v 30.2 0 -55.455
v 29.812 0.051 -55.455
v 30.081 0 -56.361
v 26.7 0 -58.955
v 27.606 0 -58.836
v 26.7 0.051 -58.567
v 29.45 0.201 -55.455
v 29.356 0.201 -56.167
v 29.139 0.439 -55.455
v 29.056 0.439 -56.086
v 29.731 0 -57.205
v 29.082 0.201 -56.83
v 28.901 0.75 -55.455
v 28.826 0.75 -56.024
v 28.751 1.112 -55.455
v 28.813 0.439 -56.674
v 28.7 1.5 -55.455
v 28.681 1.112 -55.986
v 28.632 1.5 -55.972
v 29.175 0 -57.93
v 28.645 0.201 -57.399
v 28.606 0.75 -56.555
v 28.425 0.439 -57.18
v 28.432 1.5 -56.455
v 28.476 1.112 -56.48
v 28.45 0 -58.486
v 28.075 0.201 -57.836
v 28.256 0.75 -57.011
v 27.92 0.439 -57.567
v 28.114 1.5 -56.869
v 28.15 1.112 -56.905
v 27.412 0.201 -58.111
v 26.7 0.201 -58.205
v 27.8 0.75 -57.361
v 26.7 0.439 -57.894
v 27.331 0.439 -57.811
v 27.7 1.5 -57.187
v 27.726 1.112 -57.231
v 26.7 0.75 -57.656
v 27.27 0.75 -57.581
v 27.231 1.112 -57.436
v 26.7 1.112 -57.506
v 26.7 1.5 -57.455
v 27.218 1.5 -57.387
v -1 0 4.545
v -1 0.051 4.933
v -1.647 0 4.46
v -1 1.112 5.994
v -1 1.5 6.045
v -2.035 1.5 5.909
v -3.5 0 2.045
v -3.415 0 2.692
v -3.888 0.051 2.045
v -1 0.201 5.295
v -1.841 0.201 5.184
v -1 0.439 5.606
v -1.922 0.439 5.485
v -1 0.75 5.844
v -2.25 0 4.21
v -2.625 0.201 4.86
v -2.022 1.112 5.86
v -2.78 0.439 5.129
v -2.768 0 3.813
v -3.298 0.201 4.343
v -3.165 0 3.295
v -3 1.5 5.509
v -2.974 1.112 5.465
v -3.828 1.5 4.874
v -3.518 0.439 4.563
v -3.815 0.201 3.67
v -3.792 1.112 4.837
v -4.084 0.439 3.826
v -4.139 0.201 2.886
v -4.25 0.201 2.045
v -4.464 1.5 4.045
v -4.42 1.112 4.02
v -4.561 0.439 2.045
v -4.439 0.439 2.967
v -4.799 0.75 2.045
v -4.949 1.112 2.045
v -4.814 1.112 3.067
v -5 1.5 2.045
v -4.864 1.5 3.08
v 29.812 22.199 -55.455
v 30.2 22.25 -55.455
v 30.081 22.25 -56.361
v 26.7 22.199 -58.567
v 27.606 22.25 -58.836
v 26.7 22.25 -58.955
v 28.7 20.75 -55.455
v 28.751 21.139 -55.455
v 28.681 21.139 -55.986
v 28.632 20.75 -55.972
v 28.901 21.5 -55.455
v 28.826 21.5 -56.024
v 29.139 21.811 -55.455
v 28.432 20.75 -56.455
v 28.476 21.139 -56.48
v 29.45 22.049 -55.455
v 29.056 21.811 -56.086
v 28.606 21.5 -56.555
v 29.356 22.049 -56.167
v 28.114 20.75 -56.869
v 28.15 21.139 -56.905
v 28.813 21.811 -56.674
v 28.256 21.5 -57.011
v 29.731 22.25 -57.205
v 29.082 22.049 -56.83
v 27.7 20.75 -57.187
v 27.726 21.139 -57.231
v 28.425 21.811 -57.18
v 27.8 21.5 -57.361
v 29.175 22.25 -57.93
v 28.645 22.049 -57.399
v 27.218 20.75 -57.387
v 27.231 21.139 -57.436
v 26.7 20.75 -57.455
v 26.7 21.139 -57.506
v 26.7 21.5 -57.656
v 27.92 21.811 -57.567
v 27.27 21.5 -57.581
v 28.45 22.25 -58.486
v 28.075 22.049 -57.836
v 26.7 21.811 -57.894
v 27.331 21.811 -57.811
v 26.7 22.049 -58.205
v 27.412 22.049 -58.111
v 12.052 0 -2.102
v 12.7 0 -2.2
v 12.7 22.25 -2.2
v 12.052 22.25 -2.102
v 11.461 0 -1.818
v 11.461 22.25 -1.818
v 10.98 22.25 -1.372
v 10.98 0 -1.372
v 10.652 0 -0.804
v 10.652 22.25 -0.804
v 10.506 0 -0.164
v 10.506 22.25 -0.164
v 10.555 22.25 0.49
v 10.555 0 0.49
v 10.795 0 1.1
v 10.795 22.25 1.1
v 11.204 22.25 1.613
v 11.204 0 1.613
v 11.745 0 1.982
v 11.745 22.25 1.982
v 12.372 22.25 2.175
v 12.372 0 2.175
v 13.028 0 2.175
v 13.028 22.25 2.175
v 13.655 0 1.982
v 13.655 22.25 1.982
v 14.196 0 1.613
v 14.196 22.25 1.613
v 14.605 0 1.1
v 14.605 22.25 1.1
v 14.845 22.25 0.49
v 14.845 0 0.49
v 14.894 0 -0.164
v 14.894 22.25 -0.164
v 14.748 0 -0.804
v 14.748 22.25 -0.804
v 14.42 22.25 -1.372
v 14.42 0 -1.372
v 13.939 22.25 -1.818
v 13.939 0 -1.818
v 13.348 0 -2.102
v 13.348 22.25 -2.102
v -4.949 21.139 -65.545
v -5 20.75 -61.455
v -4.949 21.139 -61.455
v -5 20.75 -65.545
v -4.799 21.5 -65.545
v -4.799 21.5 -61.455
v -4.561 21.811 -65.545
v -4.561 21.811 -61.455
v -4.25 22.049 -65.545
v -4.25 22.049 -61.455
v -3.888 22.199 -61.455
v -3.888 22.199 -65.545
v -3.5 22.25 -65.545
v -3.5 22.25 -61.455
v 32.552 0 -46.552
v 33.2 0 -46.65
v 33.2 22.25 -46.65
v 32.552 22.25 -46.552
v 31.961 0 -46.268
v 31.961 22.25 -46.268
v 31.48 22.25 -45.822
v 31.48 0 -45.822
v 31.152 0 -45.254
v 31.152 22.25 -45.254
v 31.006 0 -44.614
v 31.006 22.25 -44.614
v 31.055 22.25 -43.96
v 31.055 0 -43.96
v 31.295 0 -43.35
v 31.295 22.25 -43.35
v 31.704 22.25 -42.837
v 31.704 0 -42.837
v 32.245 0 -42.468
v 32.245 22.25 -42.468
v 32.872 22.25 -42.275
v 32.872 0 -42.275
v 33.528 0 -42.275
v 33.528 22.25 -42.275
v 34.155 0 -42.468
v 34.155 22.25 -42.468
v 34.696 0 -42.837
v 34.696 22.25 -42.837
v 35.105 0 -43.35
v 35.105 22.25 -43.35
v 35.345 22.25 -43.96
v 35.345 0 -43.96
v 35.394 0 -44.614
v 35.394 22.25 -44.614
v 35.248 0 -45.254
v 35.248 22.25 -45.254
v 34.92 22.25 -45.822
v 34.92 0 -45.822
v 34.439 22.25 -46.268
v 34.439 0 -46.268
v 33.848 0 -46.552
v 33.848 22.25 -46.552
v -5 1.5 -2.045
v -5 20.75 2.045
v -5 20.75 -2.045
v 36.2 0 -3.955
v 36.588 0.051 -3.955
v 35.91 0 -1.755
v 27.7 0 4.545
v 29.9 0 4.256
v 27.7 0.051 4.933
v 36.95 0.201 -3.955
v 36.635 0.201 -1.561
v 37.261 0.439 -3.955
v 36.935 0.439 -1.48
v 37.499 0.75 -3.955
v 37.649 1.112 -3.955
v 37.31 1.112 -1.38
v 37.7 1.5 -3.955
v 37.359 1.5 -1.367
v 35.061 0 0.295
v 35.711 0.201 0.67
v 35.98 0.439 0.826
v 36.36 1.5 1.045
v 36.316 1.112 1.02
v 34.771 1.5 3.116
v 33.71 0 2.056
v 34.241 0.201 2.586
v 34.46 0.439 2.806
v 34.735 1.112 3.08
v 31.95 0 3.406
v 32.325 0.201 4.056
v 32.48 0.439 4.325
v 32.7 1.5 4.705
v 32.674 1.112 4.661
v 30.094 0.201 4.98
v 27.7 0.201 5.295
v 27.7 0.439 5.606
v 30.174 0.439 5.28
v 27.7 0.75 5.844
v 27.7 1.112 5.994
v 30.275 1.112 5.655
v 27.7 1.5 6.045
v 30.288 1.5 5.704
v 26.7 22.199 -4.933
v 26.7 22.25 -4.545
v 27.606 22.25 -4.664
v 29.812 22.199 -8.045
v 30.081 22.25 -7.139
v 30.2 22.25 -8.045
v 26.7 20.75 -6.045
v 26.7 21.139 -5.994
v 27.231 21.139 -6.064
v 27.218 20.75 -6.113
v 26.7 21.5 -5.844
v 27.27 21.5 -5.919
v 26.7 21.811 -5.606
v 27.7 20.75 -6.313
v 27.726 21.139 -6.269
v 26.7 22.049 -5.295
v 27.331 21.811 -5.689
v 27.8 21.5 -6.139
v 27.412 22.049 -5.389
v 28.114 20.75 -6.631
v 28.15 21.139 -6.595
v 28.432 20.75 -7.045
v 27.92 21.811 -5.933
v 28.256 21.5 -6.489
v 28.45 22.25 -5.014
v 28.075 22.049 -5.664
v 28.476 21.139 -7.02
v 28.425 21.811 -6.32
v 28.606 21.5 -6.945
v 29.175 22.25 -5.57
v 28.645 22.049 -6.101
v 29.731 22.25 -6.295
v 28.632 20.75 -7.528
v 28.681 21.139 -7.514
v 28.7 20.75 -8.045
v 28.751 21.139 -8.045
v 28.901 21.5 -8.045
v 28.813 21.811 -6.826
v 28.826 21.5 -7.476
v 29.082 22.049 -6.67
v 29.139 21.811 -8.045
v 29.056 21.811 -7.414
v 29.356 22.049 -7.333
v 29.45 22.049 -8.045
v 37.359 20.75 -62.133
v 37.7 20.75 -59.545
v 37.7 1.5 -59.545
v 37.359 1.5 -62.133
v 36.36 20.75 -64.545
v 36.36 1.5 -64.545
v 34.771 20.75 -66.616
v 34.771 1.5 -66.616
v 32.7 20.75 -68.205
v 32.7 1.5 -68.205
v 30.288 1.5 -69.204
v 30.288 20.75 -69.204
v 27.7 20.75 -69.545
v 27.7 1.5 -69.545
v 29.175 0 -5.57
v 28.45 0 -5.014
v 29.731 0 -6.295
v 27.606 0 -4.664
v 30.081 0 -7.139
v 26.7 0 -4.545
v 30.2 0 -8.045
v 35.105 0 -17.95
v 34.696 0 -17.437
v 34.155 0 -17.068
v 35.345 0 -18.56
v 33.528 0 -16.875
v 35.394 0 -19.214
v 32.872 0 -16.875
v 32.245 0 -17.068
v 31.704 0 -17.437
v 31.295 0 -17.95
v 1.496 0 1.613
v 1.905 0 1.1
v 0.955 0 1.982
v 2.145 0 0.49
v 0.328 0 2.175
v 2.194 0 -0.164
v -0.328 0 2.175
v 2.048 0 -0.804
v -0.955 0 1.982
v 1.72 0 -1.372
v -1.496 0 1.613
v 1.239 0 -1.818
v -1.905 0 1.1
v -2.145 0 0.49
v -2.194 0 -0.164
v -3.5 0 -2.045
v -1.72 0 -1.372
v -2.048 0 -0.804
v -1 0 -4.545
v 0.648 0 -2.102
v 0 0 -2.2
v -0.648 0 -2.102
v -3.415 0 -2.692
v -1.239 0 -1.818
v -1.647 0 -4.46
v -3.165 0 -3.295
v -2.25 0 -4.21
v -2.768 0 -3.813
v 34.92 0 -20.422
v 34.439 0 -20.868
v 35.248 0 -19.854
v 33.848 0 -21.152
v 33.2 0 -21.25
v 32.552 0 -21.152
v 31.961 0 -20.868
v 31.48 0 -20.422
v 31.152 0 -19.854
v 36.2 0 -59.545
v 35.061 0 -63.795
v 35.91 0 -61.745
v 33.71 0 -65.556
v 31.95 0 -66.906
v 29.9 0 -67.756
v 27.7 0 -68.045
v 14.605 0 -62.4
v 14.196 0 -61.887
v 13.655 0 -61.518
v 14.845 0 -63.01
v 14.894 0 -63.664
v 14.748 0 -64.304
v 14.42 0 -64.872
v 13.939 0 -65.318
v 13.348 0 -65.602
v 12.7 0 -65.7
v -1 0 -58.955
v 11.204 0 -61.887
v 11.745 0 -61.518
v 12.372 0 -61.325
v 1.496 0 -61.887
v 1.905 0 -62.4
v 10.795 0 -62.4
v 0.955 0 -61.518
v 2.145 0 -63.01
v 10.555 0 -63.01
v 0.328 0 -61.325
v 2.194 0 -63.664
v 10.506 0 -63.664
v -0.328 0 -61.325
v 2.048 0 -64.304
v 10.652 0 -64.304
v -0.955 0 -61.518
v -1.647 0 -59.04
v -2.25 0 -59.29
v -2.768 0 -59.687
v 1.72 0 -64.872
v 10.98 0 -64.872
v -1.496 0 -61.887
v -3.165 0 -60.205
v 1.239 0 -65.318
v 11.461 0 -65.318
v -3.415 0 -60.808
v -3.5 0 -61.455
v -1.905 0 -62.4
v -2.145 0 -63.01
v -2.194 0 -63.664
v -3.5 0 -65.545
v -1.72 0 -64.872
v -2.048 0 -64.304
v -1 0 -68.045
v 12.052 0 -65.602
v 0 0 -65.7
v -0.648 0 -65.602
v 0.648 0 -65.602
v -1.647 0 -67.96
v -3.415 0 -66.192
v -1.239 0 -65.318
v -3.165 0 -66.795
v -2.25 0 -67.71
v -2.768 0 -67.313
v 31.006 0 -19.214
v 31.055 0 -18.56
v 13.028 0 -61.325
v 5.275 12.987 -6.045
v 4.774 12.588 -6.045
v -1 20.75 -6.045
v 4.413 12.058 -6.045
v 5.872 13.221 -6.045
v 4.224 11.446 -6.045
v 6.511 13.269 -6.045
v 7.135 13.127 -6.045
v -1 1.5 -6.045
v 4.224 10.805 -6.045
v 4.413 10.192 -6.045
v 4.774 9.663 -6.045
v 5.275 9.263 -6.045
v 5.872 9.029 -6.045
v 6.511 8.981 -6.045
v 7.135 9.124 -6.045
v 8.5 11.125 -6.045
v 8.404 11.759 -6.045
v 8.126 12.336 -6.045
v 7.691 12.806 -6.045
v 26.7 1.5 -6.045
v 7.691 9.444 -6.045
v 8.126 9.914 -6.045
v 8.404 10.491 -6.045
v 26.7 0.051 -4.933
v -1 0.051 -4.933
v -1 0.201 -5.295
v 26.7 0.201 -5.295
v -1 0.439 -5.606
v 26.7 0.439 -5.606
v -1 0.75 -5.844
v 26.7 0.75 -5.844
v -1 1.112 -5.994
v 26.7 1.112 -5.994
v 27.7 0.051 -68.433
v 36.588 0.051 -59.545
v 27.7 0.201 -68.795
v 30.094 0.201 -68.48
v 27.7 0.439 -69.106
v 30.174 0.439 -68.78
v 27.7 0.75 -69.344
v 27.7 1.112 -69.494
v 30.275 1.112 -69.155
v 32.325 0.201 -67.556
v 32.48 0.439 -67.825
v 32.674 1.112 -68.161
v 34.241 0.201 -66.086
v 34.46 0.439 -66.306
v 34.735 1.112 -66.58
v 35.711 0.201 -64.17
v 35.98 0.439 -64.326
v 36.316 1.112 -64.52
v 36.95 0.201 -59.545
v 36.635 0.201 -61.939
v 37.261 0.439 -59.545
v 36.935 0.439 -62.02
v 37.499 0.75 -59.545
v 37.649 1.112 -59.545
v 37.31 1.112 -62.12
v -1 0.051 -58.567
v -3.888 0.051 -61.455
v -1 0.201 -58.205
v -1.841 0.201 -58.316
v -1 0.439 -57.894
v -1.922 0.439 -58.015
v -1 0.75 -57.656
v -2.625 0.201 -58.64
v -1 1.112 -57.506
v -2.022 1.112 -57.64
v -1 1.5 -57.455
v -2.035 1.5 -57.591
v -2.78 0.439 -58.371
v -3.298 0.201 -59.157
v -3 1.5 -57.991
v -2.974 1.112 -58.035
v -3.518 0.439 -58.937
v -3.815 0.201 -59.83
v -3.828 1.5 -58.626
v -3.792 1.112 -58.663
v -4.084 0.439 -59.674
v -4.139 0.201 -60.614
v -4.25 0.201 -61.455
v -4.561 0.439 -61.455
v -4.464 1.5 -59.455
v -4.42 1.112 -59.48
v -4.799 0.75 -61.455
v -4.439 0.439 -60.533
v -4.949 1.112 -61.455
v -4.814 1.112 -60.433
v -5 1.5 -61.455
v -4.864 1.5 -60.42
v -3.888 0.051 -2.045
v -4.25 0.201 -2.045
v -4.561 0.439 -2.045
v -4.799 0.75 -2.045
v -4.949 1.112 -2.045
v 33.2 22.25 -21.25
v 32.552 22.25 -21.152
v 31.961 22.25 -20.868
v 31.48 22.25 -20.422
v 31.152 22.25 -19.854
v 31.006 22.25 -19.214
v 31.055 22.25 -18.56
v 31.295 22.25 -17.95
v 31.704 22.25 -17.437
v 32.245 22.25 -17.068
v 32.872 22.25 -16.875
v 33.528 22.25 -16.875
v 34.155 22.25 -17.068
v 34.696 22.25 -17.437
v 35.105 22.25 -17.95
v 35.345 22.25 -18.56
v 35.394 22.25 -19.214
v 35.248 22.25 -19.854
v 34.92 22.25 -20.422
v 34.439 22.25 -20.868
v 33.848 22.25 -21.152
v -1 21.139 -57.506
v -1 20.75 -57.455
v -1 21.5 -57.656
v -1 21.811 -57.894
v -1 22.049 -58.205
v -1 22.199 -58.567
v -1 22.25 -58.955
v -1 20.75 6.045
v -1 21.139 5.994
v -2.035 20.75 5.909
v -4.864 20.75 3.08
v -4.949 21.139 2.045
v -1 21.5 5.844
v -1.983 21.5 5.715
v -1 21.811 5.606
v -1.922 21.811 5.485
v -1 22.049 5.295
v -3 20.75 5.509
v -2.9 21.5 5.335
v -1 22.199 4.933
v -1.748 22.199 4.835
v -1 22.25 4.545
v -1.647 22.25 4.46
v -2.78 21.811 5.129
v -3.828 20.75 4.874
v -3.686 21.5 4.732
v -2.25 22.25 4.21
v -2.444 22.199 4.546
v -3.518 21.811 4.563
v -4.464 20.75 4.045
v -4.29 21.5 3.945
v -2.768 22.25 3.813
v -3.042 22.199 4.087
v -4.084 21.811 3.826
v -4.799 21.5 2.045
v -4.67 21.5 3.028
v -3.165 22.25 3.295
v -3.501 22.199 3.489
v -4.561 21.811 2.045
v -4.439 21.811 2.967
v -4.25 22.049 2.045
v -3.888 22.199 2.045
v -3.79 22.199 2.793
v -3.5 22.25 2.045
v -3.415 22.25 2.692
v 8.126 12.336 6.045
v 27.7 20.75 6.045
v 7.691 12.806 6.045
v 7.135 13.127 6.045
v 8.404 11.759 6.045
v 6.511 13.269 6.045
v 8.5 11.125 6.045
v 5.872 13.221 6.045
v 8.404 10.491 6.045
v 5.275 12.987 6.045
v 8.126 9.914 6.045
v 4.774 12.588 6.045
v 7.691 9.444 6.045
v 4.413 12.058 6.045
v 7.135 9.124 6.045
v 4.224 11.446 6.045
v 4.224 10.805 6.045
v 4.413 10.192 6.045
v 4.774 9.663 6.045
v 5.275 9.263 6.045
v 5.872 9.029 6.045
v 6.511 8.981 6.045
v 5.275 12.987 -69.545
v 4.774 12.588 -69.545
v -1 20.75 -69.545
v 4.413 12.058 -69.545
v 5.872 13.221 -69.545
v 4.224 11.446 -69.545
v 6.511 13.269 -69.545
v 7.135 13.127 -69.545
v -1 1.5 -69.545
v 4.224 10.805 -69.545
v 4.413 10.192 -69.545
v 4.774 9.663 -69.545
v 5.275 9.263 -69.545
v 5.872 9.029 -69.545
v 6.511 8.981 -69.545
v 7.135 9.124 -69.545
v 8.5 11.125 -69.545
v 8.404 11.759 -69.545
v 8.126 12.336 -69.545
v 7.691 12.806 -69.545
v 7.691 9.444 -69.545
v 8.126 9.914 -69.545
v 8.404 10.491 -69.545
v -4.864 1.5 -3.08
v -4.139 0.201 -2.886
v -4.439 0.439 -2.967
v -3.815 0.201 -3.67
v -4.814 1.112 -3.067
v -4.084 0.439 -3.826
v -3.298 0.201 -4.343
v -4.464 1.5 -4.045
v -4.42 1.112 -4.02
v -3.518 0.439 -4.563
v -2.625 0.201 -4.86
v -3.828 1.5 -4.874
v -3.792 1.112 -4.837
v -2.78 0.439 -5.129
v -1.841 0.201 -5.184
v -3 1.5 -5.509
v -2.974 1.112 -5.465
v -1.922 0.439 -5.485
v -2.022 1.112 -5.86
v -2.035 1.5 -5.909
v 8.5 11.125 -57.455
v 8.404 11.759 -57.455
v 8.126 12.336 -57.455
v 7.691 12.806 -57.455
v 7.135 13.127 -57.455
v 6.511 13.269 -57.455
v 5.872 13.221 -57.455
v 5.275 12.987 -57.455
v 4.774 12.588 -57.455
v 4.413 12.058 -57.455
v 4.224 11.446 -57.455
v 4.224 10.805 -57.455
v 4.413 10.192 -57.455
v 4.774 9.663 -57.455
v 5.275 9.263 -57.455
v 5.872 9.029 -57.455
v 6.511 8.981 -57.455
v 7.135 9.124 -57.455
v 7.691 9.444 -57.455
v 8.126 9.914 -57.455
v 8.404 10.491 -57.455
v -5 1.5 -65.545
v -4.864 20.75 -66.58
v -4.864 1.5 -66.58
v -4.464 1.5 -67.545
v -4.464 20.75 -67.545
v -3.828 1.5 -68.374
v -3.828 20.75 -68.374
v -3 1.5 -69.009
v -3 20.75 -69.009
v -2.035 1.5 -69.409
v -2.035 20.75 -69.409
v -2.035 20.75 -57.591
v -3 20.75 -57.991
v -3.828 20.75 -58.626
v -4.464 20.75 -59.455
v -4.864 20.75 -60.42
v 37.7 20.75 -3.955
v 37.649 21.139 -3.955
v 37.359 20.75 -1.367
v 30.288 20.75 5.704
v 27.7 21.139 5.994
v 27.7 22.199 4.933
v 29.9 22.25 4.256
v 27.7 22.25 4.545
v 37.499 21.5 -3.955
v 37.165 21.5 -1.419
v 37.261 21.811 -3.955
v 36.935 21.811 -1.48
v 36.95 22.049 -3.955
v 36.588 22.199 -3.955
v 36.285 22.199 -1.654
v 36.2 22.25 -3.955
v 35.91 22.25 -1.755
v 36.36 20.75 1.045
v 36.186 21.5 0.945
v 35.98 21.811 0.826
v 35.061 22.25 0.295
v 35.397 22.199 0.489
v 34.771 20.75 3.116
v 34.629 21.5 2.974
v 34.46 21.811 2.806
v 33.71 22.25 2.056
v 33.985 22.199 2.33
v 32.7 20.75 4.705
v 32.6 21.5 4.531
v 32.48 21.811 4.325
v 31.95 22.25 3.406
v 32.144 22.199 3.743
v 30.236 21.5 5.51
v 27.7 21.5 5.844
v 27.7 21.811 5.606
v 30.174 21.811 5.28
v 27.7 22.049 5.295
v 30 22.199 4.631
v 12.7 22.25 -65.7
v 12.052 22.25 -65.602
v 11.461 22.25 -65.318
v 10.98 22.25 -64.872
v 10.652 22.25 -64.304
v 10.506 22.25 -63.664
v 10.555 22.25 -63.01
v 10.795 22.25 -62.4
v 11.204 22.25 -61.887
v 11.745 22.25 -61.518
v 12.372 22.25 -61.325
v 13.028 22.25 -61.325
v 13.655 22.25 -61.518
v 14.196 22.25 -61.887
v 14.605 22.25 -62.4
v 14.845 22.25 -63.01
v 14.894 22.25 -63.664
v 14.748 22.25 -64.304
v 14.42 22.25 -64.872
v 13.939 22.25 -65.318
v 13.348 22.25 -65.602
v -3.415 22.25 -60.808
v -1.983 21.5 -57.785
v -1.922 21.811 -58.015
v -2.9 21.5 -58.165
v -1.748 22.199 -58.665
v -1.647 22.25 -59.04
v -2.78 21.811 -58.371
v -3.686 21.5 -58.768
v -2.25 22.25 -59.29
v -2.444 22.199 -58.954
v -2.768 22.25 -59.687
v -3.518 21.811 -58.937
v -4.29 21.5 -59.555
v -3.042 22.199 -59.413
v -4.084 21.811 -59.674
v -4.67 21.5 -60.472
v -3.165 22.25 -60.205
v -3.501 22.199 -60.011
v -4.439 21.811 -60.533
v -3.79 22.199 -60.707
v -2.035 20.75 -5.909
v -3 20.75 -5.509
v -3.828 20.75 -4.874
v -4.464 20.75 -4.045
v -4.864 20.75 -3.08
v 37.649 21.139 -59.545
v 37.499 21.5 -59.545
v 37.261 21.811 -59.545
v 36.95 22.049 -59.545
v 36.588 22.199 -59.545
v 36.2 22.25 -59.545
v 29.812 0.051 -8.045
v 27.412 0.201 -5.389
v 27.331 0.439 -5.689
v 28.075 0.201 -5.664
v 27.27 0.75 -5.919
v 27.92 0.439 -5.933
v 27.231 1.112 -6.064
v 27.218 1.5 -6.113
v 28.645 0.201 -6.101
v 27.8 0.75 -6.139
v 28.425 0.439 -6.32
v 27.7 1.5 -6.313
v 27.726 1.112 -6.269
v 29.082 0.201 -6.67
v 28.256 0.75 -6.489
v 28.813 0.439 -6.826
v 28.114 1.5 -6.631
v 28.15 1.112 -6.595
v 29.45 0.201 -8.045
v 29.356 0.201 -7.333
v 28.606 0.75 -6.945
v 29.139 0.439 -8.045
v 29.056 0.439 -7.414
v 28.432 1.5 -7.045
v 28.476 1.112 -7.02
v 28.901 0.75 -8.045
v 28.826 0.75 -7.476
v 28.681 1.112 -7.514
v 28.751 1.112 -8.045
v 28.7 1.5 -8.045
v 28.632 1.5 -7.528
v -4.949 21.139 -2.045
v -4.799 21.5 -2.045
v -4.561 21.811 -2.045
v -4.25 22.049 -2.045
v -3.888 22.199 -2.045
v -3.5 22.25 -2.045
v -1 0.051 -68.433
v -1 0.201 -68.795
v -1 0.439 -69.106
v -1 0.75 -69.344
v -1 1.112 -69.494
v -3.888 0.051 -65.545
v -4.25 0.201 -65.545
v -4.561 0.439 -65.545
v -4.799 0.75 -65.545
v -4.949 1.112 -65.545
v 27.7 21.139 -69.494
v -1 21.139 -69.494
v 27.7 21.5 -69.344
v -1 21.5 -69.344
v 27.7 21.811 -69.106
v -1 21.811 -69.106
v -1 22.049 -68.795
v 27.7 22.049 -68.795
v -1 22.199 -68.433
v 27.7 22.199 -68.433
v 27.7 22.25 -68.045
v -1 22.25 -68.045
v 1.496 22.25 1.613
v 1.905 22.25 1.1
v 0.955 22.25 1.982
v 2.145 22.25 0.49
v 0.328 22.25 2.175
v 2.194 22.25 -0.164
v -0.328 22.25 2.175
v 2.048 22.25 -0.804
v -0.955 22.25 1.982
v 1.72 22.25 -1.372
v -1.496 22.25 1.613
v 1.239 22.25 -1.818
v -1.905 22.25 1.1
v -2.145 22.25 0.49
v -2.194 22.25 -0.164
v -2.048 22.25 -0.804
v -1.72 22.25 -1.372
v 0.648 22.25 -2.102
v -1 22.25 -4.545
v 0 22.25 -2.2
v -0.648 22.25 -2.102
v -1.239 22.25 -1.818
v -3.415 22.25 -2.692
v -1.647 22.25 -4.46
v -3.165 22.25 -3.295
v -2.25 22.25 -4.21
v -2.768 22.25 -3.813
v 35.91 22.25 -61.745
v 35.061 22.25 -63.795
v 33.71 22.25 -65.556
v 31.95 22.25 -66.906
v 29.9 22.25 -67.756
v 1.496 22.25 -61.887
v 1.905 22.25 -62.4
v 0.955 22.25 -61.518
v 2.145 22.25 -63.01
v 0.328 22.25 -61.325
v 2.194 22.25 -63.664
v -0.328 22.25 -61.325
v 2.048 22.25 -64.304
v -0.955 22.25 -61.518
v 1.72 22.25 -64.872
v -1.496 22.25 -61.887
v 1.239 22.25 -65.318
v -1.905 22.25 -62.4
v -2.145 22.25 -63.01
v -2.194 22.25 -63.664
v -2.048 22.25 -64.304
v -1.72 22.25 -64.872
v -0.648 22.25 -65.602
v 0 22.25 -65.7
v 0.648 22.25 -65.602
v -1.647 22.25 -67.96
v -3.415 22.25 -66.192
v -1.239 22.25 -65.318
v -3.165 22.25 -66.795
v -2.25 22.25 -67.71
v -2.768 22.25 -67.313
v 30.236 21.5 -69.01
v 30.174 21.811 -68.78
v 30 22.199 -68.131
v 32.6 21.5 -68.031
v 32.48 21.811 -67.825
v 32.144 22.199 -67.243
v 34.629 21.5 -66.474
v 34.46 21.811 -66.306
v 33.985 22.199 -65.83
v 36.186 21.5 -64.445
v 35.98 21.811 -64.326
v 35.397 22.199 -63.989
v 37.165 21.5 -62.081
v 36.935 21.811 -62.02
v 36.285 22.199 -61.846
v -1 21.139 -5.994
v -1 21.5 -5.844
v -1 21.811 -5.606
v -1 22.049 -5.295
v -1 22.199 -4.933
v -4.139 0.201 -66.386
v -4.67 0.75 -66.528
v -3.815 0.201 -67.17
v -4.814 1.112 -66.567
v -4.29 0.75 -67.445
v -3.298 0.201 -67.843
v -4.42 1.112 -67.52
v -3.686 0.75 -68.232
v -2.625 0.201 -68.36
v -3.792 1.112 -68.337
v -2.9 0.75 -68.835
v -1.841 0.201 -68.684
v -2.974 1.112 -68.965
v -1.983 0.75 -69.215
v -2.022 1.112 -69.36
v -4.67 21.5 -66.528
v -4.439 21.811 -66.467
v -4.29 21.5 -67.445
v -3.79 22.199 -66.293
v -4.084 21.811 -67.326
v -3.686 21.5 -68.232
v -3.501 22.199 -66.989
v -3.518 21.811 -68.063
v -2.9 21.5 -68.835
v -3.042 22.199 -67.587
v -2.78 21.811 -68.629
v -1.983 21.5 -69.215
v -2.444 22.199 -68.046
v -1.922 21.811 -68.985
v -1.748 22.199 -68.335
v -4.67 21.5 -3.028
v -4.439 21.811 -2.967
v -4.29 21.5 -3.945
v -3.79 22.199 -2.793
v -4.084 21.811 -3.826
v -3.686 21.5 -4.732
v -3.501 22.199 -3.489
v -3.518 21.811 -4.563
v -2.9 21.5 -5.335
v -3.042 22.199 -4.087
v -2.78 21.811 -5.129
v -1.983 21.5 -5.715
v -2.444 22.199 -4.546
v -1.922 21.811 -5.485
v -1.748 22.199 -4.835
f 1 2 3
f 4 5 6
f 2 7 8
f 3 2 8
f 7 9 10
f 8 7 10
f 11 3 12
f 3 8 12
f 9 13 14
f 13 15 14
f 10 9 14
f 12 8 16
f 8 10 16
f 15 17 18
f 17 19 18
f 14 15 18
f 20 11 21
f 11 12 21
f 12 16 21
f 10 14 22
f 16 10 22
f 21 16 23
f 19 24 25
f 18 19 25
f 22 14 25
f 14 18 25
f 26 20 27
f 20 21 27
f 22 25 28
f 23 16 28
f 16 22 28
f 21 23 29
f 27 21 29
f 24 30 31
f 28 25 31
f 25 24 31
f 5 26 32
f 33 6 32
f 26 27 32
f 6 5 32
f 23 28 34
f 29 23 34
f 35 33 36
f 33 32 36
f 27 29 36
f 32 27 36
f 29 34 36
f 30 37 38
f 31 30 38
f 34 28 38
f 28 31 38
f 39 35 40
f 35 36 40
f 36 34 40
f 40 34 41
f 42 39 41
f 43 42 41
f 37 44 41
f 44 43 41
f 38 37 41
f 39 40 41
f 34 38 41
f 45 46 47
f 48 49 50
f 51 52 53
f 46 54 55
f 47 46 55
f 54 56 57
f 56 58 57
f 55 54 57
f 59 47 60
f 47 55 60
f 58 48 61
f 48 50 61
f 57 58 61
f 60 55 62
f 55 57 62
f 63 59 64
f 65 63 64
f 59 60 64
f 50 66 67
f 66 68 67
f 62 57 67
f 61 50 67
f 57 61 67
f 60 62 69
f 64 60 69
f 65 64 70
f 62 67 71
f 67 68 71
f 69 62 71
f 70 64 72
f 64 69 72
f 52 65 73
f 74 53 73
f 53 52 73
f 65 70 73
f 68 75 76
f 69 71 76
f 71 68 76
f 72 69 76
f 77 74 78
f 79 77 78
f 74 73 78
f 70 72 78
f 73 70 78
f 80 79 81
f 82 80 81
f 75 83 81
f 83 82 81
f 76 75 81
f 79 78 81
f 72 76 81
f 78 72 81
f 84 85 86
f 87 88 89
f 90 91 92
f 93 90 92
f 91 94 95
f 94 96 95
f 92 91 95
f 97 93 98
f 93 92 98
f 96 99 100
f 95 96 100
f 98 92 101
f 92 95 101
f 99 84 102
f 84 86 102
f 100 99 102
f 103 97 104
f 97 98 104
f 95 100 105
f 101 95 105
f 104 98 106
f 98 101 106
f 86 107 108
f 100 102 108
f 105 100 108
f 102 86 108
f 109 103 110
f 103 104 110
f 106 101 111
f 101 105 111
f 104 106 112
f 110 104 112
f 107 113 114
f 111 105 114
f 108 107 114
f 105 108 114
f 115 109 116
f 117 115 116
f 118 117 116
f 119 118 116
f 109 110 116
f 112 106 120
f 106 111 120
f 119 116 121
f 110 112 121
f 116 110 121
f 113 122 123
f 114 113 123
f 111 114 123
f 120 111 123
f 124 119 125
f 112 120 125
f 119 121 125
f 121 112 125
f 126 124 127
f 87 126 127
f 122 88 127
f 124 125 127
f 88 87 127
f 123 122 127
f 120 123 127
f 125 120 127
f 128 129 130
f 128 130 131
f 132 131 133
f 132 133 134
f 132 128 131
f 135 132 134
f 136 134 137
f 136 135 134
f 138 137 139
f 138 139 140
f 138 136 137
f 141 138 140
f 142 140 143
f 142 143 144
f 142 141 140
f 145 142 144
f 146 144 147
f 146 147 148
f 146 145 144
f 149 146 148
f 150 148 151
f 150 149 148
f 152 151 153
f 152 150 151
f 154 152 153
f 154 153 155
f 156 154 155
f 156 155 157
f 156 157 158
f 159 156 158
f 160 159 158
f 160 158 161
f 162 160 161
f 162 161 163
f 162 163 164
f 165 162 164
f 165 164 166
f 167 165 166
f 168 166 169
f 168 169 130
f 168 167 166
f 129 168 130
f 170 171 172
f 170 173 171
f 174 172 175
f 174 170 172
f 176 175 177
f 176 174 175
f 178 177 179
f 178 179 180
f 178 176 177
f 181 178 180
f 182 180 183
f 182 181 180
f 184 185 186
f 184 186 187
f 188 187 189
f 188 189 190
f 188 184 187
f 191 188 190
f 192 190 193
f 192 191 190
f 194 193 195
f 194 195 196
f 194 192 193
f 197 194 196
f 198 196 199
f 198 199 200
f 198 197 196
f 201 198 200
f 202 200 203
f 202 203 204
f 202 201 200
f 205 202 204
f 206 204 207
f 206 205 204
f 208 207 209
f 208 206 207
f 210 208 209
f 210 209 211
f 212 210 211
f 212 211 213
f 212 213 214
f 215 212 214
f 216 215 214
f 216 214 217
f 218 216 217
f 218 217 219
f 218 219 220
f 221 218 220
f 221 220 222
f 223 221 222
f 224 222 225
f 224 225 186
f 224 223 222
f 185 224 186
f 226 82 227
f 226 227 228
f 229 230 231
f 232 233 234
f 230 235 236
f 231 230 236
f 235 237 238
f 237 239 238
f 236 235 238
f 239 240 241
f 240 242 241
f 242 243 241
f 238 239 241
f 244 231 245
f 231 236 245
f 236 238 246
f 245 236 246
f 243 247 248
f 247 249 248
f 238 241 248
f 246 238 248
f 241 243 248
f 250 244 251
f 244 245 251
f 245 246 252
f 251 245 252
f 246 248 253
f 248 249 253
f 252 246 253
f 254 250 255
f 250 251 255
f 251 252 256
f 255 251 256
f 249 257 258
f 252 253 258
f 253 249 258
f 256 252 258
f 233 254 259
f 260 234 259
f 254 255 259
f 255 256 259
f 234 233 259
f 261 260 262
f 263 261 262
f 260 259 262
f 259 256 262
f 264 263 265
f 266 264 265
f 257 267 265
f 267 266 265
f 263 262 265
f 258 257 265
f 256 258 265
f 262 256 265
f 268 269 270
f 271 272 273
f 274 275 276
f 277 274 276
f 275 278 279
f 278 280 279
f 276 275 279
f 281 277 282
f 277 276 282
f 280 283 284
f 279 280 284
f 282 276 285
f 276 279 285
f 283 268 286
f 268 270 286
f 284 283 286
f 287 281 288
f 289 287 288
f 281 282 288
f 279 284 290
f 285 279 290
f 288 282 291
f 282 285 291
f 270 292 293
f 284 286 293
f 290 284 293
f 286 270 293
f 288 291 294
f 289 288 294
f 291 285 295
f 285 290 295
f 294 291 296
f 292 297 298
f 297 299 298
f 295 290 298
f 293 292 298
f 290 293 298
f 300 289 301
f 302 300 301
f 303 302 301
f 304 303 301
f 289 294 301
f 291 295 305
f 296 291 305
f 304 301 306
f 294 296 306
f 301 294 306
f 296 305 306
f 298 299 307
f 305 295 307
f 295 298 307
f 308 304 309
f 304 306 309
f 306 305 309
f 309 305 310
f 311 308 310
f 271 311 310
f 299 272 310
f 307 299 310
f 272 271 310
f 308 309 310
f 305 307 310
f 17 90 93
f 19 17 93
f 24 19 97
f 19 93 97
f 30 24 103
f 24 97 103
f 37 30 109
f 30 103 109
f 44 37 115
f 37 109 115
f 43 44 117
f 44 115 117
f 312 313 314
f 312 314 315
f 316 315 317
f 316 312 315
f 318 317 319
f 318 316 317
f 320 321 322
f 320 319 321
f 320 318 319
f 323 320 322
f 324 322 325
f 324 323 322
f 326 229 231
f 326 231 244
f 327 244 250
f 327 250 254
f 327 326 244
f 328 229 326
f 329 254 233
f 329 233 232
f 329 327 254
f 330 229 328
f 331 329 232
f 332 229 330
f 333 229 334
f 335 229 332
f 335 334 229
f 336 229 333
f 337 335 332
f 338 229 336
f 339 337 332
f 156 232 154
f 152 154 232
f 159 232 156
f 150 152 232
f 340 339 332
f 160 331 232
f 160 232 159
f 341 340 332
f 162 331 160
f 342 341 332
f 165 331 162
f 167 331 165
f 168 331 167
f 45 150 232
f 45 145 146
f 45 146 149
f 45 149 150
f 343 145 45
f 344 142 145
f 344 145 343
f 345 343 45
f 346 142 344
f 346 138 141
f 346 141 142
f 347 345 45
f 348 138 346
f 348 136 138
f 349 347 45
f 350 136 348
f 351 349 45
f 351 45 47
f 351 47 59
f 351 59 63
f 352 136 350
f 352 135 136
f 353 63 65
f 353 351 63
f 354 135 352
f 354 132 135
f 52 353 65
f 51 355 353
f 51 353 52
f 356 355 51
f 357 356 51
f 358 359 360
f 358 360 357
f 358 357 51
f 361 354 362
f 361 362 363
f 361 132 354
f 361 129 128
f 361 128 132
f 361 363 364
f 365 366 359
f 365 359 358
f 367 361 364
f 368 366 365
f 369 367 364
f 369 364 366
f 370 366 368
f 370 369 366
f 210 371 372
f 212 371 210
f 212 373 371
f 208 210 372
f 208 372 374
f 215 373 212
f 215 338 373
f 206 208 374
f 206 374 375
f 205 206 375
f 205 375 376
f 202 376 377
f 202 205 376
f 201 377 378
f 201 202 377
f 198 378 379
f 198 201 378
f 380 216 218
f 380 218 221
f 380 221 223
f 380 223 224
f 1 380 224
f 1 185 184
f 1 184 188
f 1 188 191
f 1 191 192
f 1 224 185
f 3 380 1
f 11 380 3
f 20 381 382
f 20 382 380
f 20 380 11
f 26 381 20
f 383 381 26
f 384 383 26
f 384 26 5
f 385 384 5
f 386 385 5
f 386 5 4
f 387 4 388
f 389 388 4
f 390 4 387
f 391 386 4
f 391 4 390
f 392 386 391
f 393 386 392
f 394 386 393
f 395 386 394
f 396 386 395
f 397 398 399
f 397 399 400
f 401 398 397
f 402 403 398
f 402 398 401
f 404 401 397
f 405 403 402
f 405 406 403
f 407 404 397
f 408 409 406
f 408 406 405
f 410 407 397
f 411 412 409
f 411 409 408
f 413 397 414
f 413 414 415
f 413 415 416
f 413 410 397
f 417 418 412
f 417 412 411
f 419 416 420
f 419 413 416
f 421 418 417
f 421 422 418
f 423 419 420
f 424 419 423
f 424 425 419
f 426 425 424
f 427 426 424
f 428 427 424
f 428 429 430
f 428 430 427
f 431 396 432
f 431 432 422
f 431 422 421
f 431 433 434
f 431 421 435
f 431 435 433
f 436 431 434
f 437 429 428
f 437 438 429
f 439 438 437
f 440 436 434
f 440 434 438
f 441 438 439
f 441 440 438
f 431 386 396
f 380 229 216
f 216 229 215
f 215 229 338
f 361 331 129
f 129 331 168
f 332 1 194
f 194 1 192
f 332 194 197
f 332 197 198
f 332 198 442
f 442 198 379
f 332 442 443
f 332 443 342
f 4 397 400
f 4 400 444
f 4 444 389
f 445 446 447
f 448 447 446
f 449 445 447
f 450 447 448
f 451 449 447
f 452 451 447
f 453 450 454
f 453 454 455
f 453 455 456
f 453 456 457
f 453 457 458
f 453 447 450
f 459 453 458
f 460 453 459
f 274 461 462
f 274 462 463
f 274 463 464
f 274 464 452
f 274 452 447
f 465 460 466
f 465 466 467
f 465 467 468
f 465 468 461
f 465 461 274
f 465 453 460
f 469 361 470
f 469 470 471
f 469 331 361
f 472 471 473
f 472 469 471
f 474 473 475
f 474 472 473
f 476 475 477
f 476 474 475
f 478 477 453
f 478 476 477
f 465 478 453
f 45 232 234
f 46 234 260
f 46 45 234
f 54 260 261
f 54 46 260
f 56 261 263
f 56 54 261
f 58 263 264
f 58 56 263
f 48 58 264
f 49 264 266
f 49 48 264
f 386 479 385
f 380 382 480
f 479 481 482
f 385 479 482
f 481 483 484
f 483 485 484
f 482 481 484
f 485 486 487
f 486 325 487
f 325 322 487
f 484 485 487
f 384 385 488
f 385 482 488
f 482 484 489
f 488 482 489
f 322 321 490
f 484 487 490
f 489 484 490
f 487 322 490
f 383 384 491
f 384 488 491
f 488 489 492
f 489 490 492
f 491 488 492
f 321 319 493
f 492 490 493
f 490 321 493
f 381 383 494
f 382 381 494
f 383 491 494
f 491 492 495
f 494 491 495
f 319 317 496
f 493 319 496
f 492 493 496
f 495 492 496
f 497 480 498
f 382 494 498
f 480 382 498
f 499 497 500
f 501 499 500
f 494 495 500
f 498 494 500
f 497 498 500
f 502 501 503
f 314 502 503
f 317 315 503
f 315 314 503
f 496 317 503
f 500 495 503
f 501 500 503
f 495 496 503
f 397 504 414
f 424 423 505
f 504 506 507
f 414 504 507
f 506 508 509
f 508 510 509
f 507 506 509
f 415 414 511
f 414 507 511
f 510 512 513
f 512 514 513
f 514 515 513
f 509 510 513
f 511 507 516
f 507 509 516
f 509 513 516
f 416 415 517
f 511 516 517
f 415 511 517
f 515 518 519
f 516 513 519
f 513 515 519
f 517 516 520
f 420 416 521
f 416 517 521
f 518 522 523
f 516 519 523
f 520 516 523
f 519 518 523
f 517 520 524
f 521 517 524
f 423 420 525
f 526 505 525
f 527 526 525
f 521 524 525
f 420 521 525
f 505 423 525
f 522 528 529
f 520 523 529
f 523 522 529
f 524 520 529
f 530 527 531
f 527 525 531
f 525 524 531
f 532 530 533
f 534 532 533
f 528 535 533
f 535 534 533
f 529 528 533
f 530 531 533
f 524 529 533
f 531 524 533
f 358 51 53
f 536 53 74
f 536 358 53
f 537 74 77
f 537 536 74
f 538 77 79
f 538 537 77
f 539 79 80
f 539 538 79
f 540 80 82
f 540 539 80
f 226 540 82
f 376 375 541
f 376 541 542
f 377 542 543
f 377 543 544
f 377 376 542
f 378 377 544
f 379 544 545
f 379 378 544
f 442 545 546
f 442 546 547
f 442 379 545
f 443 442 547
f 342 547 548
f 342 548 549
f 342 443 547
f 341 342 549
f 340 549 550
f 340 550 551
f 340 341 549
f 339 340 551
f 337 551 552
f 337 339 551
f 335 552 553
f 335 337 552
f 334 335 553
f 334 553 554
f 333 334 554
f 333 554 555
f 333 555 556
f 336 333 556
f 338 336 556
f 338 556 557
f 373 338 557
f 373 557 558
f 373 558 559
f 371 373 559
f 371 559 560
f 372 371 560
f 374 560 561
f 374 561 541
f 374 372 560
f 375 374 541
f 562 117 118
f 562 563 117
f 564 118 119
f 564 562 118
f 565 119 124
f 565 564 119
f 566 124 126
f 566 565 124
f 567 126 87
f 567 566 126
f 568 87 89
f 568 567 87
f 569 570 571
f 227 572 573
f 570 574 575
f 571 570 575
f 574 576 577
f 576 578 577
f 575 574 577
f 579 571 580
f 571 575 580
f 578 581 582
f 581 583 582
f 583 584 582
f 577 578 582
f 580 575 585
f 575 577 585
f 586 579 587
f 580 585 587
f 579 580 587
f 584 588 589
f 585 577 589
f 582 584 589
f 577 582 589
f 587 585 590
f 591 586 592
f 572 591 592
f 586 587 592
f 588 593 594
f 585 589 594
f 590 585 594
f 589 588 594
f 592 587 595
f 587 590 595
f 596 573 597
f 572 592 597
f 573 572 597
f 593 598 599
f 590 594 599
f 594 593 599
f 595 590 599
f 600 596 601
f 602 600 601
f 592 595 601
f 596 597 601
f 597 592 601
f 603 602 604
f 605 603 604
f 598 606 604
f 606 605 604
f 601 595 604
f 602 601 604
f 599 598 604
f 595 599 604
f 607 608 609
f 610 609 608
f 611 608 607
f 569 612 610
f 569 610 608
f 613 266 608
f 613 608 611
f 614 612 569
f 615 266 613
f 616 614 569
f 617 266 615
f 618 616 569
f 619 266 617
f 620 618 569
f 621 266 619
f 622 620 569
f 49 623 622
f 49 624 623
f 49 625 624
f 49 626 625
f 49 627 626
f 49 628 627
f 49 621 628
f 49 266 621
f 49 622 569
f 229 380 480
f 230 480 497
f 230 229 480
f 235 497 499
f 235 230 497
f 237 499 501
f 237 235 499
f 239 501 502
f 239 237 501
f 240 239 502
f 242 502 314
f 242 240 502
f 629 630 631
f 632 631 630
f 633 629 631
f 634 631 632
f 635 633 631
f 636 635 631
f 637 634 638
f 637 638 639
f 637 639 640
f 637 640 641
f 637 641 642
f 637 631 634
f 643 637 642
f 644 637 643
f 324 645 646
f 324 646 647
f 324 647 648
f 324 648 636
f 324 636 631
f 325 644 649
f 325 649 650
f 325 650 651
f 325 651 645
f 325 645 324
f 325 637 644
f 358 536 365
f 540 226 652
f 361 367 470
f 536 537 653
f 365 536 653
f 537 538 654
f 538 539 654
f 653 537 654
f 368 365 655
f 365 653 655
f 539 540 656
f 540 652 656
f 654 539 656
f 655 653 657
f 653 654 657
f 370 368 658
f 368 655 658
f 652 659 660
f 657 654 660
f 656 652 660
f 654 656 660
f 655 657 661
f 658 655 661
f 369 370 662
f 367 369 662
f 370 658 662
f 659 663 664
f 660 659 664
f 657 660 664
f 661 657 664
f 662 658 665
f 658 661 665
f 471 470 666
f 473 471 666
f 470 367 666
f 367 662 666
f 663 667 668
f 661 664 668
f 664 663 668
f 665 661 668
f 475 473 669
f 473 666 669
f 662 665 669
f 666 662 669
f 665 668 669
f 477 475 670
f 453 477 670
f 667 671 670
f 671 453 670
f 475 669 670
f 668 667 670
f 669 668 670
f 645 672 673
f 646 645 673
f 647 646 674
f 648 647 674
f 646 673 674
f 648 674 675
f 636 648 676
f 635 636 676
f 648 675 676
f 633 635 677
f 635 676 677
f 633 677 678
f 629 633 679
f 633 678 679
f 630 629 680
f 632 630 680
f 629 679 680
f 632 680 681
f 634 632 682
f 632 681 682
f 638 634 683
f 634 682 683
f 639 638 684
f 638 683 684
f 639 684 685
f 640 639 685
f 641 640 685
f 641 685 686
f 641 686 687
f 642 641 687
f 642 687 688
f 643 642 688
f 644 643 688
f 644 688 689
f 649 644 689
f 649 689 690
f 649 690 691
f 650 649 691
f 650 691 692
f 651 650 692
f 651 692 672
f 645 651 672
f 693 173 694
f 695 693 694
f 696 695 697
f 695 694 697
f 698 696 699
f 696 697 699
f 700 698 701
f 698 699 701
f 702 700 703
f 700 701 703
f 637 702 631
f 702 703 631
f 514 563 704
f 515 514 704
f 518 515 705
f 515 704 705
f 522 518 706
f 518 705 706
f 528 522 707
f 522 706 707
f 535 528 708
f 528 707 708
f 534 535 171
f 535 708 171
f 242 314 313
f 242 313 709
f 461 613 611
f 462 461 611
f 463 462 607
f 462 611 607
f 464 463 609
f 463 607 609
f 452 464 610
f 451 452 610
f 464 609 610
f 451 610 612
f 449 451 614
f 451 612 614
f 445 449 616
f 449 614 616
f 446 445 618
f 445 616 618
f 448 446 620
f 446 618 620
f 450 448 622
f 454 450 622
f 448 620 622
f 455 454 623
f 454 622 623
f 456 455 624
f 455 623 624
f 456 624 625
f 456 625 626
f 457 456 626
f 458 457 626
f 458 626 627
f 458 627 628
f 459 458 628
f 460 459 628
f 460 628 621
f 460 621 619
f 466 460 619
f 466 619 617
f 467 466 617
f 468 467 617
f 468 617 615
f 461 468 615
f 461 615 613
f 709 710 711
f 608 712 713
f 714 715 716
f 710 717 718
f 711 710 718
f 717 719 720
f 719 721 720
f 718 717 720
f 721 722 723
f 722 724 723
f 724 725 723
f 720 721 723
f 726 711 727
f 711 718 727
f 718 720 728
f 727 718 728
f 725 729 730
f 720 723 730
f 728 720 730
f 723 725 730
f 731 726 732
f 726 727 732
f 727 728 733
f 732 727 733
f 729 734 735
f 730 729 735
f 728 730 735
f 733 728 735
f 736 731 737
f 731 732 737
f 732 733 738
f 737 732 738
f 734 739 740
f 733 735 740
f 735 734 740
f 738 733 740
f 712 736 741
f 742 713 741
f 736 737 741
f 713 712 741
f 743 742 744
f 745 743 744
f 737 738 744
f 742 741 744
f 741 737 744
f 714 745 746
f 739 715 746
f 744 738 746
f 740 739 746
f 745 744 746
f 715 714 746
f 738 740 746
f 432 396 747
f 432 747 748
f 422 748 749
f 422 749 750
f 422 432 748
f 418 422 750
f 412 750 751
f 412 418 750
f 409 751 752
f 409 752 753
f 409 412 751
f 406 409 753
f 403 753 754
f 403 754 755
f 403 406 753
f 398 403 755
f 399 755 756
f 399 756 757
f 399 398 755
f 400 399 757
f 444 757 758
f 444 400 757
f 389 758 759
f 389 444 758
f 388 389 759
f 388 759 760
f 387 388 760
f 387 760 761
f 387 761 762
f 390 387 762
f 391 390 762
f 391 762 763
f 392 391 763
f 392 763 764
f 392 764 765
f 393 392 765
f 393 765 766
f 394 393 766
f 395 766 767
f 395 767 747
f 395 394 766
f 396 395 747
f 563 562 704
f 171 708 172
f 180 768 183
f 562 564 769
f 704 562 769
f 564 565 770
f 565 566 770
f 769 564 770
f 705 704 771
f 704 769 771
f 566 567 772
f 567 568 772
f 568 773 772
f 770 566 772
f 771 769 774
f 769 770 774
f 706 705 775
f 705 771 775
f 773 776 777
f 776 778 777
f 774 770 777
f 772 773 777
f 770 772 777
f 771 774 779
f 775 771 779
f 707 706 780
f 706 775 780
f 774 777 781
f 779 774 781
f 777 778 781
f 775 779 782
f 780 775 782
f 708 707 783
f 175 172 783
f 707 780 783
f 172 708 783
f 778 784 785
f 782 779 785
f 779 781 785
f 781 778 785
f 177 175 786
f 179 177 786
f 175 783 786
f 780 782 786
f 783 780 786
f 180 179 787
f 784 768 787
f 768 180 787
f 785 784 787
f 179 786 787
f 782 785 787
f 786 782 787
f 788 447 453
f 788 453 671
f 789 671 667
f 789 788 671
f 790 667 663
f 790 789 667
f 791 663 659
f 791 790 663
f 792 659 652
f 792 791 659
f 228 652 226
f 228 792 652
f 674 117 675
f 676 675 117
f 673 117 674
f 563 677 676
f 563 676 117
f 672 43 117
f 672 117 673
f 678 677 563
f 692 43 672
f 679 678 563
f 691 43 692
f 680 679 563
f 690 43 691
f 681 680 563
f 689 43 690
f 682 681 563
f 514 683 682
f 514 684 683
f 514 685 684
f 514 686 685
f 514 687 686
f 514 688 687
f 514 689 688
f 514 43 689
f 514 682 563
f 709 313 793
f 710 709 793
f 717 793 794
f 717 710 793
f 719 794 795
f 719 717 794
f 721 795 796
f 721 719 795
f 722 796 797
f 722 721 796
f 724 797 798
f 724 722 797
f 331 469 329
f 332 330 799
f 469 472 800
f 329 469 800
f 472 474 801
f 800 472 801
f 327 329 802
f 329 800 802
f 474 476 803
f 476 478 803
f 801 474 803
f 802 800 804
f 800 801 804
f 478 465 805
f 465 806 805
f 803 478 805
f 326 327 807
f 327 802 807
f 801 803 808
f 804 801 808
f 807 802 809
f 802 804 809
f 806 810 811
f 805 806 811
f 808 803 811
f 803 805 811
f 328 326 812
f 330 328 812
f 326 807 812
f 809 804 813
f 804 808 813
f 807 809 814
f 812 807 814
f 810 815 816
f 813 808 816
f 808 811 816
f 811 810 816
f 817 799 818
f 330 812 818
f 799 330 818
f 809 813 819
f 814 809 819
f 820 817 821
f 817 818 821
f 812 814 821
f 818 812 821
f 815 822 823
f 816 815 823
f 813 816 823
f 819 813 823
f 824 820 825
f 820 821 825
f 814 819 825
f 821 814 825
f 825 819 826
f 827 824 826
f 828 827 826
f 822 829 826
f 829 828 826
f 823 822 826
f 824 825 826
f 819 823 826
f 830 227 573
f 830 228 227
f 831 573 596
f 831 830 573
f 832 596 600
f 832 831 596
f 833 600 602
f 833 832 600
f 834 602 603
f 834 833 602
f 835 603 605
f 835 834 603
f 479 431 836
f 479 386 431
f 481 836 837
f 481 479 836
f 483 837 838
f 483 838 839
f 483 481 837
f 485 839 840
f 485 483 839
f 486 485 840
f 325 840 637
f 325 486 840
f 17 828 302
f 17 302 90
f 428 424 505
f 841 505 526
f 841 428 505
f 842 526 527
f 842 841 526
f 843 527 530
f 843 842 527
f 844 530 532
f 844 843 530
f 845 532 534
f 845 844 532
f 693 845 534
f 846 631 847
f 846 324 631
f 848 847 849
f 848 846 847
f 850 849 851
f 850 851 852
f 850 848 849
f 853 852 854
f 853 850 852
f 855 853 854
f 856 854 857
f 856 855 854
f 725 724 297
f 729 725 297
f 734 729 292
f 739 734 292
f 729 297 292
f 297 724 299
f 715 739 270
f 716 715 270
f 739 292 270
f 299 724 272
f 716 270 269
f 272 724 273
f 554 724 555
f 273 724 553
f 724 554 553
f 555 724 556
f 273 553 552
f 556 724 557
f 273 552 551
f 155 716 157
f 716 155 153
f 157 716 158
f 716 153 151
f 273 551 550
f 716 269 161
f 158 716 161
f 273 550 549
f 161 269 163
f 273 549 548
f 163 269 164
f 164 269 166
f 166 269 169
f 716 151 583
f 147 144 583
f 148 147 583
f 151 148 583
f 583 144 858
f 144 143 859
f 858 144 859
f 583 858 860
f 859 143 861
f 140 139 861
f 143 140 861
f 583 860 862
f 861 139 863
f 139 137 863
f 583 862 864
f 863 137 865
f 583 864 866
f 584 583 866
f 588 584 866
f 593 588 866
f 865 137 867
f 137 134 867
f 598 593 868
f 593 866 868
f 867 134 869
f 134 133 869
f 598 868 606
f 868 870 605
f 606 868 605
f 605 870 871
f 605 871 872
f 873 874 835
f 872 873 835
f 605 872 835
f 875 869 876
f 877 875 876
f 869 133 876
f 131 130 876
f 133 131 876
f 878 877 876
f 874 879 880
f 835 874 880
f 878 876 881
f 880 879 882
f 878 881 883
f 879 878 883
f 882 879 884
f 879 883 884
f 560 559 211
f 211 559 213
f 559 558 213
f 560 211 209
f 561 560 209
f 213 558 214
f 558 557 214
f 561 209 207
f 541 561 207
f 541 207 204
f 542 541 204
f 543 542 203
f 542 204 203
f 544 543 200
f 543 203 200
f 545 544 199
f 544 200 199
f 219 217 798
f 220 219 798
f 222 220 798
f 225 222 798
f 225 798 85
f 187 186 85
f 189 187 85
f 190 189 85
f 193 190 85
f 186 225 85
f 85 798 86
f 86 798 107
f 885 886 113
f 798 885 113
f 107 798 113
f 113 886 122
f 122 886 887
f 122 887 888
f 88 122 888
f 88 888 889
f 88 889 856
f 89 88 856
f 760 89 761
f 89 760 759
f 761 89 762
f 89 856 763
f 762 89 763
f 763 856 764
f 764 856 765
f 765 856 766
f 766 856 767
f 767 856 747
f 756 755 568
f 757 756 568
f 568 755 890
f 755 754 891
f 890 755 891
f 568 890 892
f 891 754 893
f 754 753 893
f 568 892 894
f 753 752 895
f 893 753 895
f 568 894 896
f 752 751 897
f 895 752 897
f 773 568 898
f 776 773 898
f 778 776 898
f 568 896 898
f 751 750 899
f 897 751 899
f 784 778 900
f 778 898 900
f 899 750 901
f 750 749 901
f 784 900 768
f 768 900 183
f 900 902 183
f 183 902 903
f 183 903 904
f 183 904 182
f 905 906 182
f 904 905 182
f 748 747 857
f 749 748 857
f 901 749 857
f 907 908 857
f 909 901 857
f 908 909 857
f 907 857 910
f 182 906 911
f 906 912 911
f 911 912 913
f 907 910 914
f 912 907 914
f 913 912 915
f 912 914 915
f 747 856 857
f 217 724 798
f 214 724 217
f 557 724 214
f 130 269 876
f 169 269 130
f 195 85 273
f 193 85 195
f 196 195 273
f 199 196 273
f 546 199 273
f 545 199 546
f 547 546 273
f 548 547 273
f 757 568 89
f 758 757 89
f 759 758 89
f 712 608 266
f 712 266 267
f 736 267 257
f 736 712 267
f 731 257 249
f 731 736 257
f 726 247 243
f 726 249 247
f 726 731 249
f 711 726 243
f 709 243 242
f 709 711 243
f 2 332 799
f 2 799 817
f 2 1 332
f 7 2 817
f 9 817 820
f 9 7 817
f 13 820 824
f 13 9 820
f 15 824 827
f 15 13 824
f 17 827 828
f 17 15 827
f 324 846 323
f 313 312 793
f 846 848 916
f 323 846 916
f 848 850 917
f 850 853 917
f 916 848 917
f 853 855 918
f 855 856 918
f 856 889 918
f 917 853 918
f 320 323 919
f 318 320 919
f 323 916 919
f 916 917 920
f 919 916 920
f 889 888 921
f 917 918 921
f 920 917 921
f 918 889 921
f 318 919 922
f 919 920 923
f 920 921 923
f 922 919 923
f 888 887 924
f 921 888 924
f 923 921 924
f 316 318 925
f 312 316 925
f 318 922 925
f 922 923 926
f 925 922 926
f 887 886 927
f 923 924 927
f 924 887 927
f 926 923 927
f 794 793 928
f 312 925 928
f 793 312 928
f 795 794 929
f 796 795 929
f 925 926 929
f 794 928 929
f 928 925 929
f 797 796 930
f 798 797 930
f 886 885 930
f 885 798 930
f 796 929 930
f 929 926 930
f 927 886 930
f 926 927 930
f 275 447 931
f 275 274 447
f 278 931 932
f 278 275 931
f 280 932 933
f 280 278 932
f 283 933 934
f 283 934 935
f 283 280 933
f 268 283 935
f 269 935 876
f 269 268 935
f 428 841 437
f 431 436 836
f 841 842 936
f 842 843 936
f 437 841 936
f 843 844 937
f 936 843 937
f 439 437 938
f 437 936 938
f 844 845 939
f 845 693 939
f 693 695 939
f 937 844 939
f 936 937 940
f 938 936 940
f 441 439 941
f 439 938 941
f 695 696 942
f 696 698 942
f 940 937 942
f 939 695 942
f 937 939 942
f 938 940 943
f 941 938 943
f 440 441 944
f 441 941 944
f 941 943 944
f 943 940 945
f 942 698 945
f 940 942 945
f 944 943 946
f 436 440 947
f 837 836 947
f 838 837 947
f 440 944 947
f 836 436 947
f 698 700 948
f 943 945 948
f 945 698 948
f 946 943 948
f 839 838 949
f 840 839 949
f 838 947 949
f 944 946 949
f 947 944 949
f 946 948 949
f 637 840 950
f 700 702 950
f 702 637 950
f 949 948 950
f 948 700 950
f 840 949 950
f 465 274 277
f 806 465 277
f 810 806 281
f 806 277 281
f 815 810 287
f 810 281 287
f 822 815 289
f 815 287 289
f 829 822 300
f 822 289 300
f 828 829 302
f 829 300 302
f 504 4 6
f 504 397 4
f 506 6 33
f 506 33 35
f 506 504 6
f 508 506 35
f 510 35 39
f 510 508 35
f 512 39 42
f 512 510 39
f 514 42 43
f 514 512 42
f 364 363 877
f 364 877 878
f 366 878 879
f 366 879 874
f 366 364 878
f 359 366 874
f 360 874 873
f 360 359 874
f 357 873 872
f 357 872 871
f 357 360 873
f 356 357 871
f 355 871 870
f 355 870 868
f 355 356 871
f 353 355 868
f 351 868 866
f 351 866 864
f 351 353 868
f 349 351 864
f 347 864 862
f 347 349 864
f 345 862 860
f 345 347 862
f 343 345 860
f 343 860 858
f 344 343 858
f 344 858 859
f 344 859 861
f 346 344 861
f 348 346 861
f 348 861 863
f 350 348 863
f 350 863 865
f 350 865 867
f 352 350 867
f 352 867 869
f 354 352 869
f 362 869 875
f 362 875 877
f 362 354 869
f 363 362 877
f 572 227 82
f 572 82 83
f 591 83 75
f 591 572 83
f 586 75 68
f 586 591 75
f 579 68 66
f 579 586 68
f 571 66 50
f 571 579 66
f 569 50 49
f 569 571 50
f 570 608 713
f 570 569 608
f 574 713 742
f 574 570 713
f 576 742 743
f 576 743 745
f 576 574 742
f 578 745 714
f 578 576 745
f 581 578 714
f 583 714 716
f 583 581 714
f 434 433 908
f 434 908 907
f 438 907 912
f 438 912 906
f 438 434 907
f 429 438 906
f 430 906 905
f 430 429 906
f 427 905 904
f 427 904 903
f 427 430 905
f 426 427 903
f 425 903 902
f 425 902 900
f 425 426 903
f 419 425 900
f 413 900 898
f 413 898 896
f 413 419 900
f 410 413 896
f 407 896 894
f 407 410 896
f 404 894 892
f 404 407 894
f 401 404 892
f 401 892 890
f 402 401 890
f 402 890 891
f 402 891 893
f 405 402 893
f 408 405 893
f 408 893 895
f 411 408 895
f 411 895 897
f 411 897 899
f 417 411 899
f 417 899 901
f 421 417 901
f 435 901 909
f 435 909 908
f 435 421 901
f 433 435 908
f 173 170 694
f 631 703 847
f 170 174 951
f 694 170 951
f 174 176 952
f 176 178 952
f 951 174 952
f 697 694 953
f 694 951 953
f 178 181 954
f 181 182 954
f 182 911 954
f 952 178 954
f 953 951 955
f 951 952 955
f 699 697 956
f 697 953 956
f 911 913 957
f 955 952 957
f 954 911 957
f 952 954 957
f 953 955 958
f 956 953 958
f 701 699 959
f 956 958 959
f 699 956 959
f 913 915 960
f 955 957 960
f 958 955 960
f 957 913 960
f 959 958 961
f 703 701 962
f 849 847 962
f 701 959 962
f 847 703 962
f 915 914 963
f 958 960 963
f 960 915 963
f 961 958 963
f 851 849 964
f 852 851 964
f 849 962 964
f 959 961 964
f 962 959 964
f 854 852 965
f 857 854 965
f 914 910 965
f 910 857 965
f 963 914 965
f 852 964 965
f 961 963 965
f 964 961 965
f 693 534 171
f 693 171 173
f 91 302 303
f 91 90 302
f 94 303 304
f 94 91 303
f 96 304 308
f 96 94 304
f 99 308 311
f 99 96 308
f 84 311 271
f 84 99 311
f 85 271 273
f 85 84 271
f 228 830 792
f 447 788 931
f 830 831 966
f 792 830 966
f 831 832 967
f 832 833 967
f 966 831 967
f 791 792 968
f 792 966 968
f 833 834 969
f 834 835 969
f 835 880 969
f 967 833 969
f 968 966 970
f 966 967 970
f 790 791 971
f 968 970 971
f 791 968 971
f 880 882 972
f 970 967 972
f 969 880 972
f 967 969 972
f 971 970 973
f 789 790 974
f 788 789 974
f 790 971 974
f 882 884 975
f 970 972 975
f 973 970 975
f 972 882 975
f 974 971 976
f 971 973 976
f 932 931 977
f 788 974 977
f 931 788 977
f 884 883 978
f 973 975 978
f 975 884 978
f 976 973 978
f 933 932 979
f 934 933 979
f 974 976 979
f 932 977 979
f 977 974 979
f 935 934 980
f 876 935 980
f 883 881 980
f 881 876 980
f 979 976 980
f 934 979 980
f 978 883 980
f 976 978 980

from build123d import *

# Parameters (mm, degrees)
SKETCH1_R           = 2.2
BOSS_EXTRUDE1_DEPTH = 22.2504
FILLET1_R           = 10
FILLET2_R           = 2
FILLET3_R           = 4
FILLET4_R           = 1.5
SKETCH2_R           = 2.15
CUT_EXTRUDE1_DEPTH  = 88.351467531


with BuildPart() as part:
    # Sketch1 → Boss-Extrude1 (new body)
    with BuildSketch(Plane(origin=(0, 0, 0), x_dir=(1, 0, 0), z_dir=(0, 1, 0))):
        Polygon((-5, 6.0452), (28.7, 6.0452), (28.7, 57.4548), (-5, 57.4548), (-5, 69.5452), (37.7, 69.5452), (37.7, -6.0452), (-5, -6.0452), align=None)
        with Locations(Location((0, 0, 0), (0, 0, 90))):
            Circle(SKETCH1_R, mode=Mode.SUBTRACT)
        with Locations(Location((12.7, 0, 0), (0, 0, 90))):
            Circle(SKETCH1_R, mode=Mode.SUBTRACT)
        with Locations(Location((12.7, 63.5, 0), (0, 0, 90))):
            Circle(SKETCH1_R, mode=Mode.SUBTRACT)
        with Locations(Location((0, 63.5, 0), (0, 0, 90))):
            Circle(SKETCH1_R, mode=Mode.SUBTRACT)
        with Locations(Location((33.2, 44.45, 0), (0, 0, 90))):
            Circle(SKETCH1_R, mode=Mode.SUBTRACT)
        with Locations(Location((33.2, 19.05, 0), (0, 0, 90))):
            Circle(SKETCH1_R, mode=Mode.SUBTRACT)
    extrude(amount=BOSS_EXTRUDE1_DEPTH)

    # Fillet1
    fillet1_edges = [part.edges().sort_by_distance(p)[0] for p in [
        (37.7, 11.1252, -69.5452),
        (37.7, 11.1252, 6.0452),
    ]]
    fillet(fillet1_edges, radius=FILLET1_R)

    # Fillet2
    fillet2_edges = [part.edges().sort_by_distance(p)[0] for p in [
        (28.7, 11.1252, -6.0452),
        (28.7, 11.1252, -57.4548),
    ]]
    fillet(fillet2_edges, radius=FILLET2_R)

    # Fillet3
    fillet3_edges = [part.edges().sort_by_distance(p)[0] for p in [
        (-5, 11.1252, 6.0452),
        (-5, 11.1252, -6.0452),
        (-5, 11.1252, -57.4548),
        (-5, 11.1252, -69.5452),
    ]]
    fillet(fillet3_edges, radius=FILLET3_R)

    # Fillet4
    fillet4_edges = [part.edges().sort_by_distance(p)[0] for p in [
        (13.35, 0, -69.5452),
        (13.35, 22.2504, -69.5452),
        (37.7, 0, -31.75),
        (34.771067812, 0, 3.116267812),
        (34.771067812, 0, -66.616267812),
        (37.7, 22.2504, -31.75),
        (34.771067812, 22.2504, 3.116267812),
        (34.771067812, 22.2504, -66.616267812),
        (28.7, 0, -31.75),
        (28.7, 22.2504, -31.75),
        (12.85, 0, -57.4548),
        (12.85, 22.2504, -57.4548),
        (28.114213562, 0, -56.869013562),
        (28.114213562, 22.2504, -56.869013562),
        (28.114213562, 0, -6.630986438),
        (28.114213562, 22.2504, -6.630986438),
        (-5, 0, -63.5),
        (-5, 22.2504, -63.5),
        (13.35, 0, 6.0452),
        (-5, 0, 0),
        (12.85, 0, -6.0452),
        (-3.828427125, 0, 4.873627125),
        (-3.828427125, 0, -4.873627125),
        (-3.828427125, 0, -58.626372875),
        (-3.828427125, 0, -68.373627125),
        (12.85, 22.2504, -6.0452),
        (-5, 22.2504, 0),
        (13.35, 22.2504, 6.0452),
        (-3.828427125, 22.2504, 4.873627125),
        (-3.828427125, 22.2504, -4.873627125),
        (-3.828427125, 22.2504, -58.626372875),
        (-3.828427125, 22.2504, -68.373627125),
    ]]
    fillet(fillet4_edges, radius=FILLET4_R)

    # Sketch2 → Cut-Extrude1 (cut, through all)
    with BuildSketch(Plane.XY.offset(6.0452)):
        with Locations((6.35, 11.1252)):
            Circle(SKETCH2_R)
    extrude(amount=-CUT_EXTRUDE1_DEPTH, mode=Mode.SUBTRACT)


solid = part.part
